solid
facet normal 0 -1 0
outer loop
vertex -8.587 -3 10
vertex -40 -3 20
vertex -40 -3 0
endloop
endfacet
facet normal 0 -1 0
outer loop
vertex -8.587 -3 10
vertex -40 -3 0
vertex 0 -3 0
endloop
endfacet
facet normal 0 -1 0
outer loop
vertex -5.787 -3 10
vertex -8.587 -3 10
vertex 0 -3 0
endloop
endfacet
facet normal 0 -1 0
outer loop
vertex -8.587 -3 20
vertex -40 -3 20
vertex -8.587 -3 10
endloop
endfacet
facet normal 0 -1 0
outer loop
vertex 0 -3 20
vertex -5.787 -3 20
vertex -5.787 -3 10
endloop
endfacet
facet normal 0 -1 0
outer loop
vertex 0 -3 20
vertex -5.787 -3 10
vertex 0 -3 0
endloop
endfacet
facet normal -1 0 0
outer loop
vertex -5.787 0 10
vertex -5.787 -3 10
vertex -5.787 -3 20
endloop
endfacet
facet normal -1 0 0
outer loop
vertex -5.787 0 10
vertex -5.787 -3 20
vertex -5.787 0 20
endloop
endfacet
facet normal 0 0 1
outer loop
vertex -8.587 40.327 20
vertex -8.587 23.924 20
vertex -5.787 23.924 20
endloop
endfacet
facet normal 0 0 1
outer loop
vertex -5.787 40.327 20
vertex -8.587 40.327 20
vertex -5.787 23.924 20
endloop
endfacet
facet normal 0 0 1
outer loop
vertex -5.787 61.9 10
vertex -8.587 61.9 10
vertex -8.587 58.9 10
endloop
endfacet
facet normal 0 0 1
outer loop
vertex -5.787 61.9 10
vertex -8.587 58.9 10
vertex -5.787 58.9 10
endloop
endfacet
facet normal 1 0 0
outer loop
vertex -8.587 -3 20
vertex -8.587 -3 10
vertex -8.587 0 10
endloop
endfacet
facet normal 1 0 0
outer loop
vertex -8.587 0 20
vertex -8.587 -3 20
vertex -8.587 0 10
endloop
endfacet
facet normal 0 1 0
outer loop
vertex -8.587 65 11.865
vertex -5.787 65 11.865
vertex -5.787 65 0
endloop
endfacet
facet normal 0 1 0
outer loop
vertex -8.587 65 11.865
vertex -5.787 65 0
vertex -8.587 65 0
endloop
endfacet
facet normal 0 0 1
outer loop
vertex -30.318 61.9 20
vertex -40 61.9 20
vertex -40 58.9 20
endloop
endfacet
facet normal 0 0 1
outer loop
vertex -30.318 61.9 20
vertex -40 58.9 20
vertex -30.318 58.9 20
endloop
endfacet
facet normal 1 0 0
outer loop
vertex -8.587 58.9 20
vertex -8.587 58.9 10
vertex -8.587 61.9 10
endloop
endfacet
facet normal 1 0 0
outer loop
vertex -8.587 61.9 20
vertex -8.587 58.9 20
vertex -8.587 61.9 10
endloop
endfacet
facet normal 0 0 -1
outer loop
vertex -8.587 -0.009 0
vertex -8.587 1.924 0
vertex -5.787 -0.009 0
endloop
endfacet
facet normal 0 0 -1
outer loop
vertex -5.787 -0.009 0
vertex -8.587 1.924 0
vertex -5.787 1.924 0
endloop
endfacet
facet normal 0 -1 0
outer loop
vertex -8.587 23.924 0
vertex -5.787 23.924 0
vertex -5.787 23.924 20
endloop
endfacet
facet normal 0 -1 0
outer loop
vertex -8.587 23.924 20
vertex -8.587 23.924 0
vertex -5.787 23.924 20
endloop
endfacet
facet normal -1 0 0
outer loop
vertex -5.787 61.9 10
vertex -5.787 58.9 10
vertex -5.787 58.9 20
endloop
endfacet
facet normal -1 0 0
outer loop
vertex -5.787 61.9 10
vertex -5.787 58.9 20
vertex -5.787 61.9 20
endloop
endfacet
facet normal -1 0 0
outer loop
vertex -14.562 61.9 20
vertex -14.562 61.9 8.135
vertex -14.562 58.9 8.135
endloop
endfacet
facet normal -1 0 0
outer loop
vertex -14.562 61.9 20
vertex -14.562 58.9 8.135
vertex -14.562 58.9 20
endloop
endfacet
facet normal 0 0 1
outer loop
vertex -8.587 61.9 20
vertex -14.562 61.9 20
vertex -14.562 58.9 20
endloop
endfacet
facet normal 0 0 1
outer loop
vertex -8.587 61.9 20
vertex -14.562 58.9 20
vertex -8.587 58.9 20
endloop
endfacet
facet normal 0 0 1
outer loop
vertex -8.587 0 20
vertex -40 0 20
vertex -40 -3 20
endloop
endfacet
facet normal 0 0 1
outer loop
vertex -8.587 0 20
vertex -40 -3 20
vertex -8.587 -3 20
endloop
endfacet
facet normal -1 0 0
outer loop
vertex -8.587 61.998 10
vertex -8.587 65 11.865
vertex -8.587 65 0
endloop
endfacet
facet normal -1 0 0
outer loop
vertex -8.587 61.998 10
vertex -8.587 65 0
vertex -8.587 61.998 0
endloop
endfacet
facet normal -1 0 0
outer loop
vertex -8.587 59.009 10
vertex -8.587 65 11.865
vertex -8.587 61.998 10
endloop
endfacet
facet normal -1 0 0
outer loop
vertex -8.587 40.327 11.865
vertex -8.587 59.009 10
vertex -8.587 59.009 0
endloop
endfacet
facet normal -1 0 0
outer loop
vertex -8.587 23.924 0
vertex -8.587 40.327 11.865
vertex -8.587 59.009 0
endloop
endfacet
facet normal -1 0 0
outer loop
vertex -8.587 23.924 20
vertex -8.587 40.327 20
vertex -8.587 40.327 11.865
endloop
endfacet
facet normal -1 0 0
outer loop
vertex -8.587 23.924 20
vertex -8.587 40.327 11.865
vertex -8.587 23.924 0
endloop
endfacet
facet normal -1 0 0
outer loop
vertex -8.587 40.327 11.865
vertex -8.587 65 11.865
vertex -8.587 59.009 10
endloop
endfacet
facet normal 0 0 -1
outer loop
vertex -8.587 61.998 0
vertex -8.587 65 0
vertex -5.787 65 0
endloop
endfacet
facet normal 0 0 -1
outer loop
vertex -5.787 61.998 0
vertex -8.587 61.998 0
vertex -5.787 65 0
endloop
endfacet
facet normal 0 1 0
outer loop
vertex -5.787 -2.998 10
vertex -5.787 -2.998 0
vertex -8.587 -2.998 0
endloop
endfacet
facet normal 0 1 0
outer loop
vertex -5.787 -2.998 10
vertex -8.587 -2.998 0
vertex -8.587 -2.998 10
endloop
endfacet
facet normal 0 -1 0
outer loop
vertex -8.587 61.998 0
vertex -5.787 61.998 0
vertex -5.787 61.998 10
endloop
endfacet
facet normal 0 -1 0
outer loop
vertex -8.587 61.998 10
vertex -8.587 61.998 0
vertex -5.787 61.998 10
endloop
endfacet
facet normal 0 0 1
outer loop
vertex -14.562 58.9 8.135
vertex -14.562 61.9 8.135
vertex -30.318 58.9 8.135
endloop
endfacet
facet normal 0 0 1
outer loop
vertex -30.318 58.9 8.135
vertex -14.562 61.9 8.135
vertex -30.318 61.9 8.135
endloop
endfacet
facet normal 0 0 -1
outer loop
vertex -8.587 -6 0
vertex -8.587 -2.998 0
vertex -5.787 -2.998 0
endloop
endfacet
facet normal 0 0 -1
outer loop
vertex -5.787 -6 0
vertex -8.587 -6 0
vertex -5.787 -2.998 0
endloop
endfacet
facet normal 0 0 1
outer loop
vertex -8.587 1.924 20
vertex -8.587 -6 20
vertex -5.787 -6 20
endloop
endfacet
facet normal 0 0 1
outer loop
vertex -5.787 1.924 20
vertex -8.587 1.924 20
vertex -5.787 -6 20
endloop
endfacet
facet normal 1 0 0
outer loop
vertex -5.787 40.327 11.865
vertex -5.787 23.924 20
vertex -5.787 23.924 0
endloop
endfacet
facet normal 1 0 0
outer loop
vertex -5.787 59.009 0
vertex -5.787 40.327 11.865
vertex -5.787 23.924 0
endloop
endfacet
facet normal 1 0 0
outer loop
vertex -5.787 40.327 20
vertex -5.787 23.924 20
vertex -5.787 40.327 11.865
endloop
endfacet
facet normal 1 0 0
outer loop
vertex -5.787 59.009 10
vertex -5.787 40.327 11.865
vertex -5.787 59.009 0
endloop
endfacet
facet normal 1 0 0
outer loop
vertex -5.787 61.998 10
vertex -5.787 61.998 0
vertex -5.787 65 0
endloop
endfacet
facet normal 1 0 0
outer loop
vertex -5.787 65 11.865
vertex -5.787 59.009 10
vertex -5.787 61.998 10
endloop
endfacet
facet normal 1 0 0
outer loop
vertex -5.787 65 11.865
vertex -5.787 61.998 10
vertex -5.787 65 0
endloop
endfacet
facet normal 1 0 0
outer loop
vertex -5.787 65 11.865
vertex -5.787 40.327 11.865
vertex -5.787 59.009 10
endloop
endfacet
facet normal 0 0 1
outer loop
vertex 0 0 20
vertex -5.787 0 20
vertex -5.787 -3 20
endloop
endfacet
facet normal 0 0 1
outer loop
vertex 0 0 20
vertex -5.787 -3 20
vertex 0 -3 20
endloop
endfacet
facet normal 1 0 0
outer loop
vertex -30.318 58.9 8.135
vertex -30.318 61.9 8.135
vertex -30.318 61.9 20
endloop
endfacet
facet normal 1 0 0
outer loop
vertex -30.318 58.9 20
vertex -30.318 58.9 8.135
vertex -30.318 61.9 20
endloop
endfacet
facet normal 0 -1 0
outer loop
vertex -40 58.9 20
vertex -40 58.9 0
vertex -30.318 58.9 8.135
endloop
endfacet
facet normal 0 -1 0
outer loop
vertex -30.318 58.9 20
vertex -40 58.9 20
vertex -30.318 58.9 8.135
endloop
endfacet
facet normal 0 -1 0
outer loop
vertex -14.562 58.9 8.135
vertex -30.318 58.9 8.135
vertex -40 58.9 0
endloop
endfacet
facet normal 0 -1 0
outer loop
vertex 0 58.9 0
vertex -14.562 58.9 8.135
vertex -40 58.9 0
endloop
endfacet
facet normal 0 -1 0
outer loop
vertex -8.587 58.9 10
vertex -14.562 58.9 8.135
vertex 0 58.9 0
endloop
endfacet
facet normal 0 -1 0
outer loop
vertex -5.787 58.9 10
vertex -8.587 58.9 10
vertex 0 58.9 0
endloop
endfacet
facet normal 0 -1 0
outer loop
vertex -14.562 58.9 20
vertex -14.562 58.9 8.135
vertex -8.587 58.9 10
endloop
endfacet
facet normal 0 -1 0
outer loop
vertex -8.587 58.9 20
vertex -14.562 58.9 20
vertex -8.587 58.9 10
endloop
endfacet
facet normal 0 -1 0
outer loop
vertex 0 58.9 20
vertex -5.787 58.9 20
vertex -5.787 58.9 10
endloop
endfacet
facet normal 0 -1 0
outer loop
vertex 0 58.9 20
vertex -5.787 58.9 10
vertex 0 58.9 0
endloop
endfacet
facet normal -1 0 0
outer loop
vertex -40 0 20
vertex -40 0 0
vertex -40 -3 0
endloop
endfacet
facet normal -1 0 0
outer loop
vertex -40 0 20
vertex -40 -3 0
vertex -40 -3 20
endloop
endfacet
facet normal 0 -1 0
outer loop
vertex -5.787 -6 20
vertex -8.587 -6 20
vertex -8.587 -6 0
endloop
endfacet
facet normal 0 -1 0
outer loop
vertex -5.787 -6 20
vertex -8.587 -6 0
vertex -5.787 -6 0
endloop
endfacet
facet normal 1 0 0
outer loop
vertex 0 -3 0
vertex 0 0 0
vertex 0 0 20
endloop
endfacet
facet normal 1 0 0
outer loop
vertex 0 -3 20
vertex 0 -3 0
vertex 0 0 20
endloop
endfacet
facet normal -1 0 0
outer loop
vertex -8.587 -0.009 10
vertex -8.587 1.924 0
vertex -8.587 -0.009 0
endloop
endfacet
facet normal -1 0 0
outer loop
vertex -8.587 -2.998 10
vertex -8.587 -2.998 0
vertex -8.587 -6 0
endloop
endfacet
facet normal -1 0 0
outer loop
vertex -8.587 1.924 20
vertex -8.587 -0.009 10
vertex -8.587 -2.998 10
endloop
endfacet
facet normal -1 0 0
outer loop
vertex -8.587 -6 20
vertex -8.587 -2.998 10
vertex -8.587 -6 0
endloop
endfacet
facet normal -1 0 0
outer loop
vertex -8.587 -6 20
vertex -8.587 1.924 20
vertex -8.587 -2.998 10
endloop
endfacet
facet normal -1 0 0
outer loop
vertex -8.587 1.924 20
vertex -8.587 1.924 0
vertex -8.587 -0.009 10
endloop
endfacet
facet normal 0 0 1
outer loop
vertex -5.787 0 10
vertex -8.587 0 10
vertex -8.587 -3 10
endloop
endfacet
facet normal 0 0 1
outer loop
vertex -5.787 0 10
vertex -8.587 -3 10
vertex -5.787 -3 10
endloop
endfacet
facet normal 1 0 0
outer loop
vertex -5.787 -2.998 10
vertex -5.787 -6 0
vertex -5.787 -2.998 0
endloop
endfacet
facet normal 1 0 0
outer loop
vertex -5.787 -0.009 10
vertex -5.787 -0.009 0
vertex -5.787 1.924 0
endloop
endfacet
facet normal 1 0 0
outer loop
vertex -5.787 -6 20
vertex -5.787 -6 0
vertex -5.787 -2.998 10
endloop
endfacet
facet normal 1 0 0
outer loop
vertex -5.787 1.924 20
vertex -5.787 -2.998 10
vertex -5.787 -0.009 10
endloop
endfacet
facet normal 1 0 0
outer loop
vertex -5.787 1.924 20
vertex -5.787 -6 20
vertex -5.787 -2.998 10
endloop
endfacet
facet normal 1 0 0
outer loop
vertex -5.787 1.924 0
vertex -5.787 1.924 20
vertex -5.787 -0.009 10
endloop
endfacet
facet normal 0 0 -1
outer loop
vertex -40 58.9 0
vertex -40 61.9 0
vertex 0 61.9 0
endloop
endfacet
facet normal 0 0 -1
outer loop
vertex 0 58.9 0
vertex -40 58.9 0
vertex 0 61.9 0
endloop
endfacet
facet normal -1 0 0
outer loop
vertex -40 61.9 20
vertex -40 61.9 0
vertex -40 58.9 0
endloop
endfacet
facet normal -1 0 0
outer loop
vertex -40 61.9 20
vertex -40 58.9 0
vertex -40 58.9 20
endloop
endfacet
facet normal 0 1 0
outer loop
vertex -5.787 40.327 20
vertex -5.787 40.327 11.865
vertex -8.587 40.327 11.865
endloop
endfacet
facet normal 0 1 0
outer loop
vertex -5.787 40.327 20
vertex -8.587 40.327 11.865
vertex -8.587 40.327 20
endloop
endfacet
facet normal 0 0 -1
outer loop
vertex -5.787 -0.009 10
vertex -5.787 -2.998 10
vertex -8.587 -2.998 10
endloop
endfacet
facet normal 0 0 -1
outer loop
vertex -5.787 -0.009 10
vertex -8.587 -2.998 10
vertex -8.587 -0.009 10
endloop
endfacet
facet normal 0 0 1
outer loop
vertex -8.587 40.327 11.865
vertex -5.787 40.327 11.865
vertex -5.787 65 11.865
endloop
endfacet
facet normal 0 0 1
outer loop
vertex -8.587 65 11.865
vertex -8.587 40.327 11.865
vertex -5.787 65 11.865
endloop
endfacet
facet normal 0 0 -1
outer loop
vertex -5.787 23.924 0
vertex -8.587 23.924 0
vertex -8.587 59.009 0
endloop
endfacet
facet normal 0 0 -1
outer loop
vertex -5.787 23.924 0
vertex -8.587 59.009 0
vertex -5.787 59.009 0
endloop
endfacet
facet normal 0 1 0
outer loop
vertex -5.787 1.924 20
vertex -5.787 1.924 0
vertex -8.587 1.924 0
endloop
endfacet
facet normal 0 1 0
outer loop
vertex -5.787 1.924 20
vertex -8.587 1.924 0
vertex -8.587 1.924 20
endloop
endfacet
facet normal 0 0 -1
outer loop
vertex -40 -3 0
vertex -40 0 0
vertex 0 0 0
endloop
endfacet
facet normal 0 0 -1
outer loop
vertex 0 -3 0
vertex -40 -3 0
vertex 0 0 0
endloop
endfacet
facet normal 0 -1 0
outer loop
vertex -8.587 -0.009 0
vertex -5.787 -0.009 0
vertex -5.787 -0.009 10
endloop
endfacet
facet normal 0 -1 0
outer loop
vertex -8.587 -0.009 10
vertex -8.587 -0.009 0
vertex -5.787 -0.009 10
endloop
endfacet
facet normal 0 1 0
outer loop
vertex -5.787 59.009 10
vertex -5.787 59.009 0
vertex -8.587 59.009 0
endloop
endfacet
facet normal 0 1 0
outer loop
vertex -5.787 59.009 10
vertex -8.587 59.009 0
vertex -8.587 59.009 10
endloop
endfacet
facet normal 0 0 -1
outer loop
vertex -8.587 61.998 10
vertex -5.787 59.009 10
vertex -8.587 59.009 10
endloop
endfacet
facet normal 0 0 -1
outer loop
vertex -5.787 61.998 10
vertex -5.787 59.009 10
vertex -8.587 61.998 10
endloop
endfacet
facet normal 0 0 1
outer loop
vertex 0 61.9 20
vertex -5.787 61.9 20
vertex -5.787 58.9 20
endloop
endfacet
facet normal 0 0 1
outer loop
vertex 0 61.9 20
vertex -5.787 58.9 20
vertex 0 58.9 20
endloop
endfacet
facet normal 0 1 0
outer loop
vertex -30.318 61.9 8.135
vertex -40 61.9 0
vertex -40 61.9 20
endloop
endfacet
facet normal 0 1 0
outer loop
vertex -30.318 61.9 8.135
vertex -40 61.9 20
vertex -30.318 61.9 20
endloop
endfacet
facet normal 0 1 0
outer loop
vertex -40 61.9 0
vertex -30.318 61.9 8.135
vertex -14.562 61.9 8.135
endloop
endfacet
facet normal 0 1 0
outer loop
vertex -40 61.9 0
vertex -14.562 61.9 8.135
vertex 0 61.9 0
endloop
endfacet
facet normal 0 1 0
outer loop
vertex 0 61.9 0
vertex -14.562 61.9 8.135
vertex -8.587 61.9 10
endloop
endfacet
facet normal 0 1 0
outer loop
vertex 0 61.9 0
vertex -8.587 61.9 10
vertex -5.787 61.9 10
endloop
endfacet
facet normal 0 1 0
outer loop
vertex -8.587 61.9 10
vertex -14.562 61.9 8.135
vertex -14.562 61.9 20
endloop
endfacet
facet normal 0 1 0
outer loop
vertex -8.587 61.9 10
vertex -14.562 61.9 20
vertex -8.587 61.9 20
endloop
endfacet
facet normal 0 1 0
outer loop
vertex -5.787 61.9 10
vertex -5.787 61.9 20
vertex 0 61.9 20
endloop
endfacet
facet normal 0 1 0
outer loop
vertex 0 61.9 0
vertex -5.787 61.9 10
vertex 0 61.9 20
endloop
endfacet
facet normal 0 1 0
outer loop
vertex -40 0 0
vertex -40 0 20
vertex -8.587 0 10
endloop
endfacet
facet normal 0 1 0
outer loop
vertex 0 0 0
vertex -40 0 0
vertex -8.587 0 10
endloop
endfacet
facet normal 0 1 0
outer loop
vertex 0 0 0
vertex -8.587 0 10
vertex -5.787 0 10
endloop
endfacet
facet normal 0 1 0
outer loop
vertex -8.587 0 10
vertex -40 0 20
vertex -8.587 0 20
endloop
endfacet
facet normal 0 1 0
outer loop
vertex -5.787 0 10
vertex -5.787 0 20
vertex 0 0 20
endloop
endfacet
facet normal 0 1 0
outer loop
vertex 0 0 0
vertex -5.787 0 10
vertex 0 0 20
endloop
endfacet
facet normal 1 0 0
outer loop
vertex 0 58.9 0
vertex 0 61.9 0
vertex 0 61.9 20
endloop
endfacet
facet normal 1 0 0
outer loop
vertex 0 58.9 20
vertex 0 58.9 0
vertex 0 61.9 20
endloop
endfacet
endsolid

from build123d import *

# Parameters (mm, degrees)
F0_W      = 40
F0_H      = 20
F1_DEPTH  = 3
F2_W      = 2.8
F2_H      = 3
F3_DEPTH  = 10
F5_DEPTH  = 20
F6_W      = 2.9889008573
F6_H      = 10
F7_DEPTH  = 34.2135911891
F8_W      = 22
F8_H      = 20
F9_DEPTH  = 25
F10_W     = 24.6729651093
F10_H     = 8.1348870695
F11_DEPTH = 25
F13_W     = 15.75680729
F13_H     = 11.8645136058
F14_DEPTH = 25


with BuildPart() as f1:
    # F0 (on Front) → F1 (new body)
    with BuildSketch(Plane.XZ):
        with Locations((-20, 10)):
            Rectangle(F0_W, F0_H)
    extrude(amount=F1_DEPTH)

    # F2 (on face) → F3 (cut)
    with BuildSketch(Plane.XY.offset(20)):
        with Locations((-7.1874088109, -1.5)):
            Rectangle(F2_W, F2_H)
    extrude(amount=-F3_DEPTH, mode=Mode.SUBTRACT)


with BuildPart() as f5:
    # F4 (on face) → F5 (new body, through all)
    with BuildSketch(Plane.XY.offset(20)):
        Polygon((-5.7874088109, 65), (-8.5874088109, 65), (-8.5874088109, 0), (-8.5874088109, -3), (-8.5874088109, -6), (-5.7874088109, -6), align=None)
    extrude(amount=-F5_DEPTH)

    # F6 (on face) → F7 (cut, through all)
    with BuildSketch(Plane.YZ.offset(-5.7874088109)):
        with Locations((-1.5036289775, 5)):
            Rectangle(F6_W, F6_H)
        with Locations((60.5036289775, 5)):
            Rectangle(F6_W, F6_H)
    extrude(amount=-F7_DEPTH, mode=Mode.SUBTRACT)

    # F8 (on face) → F9 (cut)
    with BuildSketch(Plane.YZ.offset(-5.7874088109)):
        with Locations((12.9240668043, 10)):
            Rectangle(F8_W, F8_H)
    extrude(amount=-F9_DEPTH, mode=Mode.SUBTRACT)

    # F10 (on face) → F11 (cut)
    with BuildSketch(Plane.YZ.offset(-5.7874088109)):
        with Locations((52.6635174453, 15.9325564653)):
            Rectangle(F10_W, F10_H)
    extrude(amount=-F11_DEPTH, mode=Mode.SUBTRACT)


with BuildPart() as f12_1:
    # F12: copy of F1
    add(f1.part.moved(Location((0, 61.9, 0))))

    # F13 (on face) → F14 (cut)
    with BuildSketch(Plane(origin=(0, 61.9, 0), x_dir=(-1, 0, 0), z_dir=(0, 1, 0))):
        with Locations((22.4399198778, 14.0677431971)):
            Rectangle(F13_W, F13_H)
    extrude(amount=-F14_DEPTH, mode=Mode.SUBTRACT)


solid = Compound([f1.part, f5.part, f12_1.part])
